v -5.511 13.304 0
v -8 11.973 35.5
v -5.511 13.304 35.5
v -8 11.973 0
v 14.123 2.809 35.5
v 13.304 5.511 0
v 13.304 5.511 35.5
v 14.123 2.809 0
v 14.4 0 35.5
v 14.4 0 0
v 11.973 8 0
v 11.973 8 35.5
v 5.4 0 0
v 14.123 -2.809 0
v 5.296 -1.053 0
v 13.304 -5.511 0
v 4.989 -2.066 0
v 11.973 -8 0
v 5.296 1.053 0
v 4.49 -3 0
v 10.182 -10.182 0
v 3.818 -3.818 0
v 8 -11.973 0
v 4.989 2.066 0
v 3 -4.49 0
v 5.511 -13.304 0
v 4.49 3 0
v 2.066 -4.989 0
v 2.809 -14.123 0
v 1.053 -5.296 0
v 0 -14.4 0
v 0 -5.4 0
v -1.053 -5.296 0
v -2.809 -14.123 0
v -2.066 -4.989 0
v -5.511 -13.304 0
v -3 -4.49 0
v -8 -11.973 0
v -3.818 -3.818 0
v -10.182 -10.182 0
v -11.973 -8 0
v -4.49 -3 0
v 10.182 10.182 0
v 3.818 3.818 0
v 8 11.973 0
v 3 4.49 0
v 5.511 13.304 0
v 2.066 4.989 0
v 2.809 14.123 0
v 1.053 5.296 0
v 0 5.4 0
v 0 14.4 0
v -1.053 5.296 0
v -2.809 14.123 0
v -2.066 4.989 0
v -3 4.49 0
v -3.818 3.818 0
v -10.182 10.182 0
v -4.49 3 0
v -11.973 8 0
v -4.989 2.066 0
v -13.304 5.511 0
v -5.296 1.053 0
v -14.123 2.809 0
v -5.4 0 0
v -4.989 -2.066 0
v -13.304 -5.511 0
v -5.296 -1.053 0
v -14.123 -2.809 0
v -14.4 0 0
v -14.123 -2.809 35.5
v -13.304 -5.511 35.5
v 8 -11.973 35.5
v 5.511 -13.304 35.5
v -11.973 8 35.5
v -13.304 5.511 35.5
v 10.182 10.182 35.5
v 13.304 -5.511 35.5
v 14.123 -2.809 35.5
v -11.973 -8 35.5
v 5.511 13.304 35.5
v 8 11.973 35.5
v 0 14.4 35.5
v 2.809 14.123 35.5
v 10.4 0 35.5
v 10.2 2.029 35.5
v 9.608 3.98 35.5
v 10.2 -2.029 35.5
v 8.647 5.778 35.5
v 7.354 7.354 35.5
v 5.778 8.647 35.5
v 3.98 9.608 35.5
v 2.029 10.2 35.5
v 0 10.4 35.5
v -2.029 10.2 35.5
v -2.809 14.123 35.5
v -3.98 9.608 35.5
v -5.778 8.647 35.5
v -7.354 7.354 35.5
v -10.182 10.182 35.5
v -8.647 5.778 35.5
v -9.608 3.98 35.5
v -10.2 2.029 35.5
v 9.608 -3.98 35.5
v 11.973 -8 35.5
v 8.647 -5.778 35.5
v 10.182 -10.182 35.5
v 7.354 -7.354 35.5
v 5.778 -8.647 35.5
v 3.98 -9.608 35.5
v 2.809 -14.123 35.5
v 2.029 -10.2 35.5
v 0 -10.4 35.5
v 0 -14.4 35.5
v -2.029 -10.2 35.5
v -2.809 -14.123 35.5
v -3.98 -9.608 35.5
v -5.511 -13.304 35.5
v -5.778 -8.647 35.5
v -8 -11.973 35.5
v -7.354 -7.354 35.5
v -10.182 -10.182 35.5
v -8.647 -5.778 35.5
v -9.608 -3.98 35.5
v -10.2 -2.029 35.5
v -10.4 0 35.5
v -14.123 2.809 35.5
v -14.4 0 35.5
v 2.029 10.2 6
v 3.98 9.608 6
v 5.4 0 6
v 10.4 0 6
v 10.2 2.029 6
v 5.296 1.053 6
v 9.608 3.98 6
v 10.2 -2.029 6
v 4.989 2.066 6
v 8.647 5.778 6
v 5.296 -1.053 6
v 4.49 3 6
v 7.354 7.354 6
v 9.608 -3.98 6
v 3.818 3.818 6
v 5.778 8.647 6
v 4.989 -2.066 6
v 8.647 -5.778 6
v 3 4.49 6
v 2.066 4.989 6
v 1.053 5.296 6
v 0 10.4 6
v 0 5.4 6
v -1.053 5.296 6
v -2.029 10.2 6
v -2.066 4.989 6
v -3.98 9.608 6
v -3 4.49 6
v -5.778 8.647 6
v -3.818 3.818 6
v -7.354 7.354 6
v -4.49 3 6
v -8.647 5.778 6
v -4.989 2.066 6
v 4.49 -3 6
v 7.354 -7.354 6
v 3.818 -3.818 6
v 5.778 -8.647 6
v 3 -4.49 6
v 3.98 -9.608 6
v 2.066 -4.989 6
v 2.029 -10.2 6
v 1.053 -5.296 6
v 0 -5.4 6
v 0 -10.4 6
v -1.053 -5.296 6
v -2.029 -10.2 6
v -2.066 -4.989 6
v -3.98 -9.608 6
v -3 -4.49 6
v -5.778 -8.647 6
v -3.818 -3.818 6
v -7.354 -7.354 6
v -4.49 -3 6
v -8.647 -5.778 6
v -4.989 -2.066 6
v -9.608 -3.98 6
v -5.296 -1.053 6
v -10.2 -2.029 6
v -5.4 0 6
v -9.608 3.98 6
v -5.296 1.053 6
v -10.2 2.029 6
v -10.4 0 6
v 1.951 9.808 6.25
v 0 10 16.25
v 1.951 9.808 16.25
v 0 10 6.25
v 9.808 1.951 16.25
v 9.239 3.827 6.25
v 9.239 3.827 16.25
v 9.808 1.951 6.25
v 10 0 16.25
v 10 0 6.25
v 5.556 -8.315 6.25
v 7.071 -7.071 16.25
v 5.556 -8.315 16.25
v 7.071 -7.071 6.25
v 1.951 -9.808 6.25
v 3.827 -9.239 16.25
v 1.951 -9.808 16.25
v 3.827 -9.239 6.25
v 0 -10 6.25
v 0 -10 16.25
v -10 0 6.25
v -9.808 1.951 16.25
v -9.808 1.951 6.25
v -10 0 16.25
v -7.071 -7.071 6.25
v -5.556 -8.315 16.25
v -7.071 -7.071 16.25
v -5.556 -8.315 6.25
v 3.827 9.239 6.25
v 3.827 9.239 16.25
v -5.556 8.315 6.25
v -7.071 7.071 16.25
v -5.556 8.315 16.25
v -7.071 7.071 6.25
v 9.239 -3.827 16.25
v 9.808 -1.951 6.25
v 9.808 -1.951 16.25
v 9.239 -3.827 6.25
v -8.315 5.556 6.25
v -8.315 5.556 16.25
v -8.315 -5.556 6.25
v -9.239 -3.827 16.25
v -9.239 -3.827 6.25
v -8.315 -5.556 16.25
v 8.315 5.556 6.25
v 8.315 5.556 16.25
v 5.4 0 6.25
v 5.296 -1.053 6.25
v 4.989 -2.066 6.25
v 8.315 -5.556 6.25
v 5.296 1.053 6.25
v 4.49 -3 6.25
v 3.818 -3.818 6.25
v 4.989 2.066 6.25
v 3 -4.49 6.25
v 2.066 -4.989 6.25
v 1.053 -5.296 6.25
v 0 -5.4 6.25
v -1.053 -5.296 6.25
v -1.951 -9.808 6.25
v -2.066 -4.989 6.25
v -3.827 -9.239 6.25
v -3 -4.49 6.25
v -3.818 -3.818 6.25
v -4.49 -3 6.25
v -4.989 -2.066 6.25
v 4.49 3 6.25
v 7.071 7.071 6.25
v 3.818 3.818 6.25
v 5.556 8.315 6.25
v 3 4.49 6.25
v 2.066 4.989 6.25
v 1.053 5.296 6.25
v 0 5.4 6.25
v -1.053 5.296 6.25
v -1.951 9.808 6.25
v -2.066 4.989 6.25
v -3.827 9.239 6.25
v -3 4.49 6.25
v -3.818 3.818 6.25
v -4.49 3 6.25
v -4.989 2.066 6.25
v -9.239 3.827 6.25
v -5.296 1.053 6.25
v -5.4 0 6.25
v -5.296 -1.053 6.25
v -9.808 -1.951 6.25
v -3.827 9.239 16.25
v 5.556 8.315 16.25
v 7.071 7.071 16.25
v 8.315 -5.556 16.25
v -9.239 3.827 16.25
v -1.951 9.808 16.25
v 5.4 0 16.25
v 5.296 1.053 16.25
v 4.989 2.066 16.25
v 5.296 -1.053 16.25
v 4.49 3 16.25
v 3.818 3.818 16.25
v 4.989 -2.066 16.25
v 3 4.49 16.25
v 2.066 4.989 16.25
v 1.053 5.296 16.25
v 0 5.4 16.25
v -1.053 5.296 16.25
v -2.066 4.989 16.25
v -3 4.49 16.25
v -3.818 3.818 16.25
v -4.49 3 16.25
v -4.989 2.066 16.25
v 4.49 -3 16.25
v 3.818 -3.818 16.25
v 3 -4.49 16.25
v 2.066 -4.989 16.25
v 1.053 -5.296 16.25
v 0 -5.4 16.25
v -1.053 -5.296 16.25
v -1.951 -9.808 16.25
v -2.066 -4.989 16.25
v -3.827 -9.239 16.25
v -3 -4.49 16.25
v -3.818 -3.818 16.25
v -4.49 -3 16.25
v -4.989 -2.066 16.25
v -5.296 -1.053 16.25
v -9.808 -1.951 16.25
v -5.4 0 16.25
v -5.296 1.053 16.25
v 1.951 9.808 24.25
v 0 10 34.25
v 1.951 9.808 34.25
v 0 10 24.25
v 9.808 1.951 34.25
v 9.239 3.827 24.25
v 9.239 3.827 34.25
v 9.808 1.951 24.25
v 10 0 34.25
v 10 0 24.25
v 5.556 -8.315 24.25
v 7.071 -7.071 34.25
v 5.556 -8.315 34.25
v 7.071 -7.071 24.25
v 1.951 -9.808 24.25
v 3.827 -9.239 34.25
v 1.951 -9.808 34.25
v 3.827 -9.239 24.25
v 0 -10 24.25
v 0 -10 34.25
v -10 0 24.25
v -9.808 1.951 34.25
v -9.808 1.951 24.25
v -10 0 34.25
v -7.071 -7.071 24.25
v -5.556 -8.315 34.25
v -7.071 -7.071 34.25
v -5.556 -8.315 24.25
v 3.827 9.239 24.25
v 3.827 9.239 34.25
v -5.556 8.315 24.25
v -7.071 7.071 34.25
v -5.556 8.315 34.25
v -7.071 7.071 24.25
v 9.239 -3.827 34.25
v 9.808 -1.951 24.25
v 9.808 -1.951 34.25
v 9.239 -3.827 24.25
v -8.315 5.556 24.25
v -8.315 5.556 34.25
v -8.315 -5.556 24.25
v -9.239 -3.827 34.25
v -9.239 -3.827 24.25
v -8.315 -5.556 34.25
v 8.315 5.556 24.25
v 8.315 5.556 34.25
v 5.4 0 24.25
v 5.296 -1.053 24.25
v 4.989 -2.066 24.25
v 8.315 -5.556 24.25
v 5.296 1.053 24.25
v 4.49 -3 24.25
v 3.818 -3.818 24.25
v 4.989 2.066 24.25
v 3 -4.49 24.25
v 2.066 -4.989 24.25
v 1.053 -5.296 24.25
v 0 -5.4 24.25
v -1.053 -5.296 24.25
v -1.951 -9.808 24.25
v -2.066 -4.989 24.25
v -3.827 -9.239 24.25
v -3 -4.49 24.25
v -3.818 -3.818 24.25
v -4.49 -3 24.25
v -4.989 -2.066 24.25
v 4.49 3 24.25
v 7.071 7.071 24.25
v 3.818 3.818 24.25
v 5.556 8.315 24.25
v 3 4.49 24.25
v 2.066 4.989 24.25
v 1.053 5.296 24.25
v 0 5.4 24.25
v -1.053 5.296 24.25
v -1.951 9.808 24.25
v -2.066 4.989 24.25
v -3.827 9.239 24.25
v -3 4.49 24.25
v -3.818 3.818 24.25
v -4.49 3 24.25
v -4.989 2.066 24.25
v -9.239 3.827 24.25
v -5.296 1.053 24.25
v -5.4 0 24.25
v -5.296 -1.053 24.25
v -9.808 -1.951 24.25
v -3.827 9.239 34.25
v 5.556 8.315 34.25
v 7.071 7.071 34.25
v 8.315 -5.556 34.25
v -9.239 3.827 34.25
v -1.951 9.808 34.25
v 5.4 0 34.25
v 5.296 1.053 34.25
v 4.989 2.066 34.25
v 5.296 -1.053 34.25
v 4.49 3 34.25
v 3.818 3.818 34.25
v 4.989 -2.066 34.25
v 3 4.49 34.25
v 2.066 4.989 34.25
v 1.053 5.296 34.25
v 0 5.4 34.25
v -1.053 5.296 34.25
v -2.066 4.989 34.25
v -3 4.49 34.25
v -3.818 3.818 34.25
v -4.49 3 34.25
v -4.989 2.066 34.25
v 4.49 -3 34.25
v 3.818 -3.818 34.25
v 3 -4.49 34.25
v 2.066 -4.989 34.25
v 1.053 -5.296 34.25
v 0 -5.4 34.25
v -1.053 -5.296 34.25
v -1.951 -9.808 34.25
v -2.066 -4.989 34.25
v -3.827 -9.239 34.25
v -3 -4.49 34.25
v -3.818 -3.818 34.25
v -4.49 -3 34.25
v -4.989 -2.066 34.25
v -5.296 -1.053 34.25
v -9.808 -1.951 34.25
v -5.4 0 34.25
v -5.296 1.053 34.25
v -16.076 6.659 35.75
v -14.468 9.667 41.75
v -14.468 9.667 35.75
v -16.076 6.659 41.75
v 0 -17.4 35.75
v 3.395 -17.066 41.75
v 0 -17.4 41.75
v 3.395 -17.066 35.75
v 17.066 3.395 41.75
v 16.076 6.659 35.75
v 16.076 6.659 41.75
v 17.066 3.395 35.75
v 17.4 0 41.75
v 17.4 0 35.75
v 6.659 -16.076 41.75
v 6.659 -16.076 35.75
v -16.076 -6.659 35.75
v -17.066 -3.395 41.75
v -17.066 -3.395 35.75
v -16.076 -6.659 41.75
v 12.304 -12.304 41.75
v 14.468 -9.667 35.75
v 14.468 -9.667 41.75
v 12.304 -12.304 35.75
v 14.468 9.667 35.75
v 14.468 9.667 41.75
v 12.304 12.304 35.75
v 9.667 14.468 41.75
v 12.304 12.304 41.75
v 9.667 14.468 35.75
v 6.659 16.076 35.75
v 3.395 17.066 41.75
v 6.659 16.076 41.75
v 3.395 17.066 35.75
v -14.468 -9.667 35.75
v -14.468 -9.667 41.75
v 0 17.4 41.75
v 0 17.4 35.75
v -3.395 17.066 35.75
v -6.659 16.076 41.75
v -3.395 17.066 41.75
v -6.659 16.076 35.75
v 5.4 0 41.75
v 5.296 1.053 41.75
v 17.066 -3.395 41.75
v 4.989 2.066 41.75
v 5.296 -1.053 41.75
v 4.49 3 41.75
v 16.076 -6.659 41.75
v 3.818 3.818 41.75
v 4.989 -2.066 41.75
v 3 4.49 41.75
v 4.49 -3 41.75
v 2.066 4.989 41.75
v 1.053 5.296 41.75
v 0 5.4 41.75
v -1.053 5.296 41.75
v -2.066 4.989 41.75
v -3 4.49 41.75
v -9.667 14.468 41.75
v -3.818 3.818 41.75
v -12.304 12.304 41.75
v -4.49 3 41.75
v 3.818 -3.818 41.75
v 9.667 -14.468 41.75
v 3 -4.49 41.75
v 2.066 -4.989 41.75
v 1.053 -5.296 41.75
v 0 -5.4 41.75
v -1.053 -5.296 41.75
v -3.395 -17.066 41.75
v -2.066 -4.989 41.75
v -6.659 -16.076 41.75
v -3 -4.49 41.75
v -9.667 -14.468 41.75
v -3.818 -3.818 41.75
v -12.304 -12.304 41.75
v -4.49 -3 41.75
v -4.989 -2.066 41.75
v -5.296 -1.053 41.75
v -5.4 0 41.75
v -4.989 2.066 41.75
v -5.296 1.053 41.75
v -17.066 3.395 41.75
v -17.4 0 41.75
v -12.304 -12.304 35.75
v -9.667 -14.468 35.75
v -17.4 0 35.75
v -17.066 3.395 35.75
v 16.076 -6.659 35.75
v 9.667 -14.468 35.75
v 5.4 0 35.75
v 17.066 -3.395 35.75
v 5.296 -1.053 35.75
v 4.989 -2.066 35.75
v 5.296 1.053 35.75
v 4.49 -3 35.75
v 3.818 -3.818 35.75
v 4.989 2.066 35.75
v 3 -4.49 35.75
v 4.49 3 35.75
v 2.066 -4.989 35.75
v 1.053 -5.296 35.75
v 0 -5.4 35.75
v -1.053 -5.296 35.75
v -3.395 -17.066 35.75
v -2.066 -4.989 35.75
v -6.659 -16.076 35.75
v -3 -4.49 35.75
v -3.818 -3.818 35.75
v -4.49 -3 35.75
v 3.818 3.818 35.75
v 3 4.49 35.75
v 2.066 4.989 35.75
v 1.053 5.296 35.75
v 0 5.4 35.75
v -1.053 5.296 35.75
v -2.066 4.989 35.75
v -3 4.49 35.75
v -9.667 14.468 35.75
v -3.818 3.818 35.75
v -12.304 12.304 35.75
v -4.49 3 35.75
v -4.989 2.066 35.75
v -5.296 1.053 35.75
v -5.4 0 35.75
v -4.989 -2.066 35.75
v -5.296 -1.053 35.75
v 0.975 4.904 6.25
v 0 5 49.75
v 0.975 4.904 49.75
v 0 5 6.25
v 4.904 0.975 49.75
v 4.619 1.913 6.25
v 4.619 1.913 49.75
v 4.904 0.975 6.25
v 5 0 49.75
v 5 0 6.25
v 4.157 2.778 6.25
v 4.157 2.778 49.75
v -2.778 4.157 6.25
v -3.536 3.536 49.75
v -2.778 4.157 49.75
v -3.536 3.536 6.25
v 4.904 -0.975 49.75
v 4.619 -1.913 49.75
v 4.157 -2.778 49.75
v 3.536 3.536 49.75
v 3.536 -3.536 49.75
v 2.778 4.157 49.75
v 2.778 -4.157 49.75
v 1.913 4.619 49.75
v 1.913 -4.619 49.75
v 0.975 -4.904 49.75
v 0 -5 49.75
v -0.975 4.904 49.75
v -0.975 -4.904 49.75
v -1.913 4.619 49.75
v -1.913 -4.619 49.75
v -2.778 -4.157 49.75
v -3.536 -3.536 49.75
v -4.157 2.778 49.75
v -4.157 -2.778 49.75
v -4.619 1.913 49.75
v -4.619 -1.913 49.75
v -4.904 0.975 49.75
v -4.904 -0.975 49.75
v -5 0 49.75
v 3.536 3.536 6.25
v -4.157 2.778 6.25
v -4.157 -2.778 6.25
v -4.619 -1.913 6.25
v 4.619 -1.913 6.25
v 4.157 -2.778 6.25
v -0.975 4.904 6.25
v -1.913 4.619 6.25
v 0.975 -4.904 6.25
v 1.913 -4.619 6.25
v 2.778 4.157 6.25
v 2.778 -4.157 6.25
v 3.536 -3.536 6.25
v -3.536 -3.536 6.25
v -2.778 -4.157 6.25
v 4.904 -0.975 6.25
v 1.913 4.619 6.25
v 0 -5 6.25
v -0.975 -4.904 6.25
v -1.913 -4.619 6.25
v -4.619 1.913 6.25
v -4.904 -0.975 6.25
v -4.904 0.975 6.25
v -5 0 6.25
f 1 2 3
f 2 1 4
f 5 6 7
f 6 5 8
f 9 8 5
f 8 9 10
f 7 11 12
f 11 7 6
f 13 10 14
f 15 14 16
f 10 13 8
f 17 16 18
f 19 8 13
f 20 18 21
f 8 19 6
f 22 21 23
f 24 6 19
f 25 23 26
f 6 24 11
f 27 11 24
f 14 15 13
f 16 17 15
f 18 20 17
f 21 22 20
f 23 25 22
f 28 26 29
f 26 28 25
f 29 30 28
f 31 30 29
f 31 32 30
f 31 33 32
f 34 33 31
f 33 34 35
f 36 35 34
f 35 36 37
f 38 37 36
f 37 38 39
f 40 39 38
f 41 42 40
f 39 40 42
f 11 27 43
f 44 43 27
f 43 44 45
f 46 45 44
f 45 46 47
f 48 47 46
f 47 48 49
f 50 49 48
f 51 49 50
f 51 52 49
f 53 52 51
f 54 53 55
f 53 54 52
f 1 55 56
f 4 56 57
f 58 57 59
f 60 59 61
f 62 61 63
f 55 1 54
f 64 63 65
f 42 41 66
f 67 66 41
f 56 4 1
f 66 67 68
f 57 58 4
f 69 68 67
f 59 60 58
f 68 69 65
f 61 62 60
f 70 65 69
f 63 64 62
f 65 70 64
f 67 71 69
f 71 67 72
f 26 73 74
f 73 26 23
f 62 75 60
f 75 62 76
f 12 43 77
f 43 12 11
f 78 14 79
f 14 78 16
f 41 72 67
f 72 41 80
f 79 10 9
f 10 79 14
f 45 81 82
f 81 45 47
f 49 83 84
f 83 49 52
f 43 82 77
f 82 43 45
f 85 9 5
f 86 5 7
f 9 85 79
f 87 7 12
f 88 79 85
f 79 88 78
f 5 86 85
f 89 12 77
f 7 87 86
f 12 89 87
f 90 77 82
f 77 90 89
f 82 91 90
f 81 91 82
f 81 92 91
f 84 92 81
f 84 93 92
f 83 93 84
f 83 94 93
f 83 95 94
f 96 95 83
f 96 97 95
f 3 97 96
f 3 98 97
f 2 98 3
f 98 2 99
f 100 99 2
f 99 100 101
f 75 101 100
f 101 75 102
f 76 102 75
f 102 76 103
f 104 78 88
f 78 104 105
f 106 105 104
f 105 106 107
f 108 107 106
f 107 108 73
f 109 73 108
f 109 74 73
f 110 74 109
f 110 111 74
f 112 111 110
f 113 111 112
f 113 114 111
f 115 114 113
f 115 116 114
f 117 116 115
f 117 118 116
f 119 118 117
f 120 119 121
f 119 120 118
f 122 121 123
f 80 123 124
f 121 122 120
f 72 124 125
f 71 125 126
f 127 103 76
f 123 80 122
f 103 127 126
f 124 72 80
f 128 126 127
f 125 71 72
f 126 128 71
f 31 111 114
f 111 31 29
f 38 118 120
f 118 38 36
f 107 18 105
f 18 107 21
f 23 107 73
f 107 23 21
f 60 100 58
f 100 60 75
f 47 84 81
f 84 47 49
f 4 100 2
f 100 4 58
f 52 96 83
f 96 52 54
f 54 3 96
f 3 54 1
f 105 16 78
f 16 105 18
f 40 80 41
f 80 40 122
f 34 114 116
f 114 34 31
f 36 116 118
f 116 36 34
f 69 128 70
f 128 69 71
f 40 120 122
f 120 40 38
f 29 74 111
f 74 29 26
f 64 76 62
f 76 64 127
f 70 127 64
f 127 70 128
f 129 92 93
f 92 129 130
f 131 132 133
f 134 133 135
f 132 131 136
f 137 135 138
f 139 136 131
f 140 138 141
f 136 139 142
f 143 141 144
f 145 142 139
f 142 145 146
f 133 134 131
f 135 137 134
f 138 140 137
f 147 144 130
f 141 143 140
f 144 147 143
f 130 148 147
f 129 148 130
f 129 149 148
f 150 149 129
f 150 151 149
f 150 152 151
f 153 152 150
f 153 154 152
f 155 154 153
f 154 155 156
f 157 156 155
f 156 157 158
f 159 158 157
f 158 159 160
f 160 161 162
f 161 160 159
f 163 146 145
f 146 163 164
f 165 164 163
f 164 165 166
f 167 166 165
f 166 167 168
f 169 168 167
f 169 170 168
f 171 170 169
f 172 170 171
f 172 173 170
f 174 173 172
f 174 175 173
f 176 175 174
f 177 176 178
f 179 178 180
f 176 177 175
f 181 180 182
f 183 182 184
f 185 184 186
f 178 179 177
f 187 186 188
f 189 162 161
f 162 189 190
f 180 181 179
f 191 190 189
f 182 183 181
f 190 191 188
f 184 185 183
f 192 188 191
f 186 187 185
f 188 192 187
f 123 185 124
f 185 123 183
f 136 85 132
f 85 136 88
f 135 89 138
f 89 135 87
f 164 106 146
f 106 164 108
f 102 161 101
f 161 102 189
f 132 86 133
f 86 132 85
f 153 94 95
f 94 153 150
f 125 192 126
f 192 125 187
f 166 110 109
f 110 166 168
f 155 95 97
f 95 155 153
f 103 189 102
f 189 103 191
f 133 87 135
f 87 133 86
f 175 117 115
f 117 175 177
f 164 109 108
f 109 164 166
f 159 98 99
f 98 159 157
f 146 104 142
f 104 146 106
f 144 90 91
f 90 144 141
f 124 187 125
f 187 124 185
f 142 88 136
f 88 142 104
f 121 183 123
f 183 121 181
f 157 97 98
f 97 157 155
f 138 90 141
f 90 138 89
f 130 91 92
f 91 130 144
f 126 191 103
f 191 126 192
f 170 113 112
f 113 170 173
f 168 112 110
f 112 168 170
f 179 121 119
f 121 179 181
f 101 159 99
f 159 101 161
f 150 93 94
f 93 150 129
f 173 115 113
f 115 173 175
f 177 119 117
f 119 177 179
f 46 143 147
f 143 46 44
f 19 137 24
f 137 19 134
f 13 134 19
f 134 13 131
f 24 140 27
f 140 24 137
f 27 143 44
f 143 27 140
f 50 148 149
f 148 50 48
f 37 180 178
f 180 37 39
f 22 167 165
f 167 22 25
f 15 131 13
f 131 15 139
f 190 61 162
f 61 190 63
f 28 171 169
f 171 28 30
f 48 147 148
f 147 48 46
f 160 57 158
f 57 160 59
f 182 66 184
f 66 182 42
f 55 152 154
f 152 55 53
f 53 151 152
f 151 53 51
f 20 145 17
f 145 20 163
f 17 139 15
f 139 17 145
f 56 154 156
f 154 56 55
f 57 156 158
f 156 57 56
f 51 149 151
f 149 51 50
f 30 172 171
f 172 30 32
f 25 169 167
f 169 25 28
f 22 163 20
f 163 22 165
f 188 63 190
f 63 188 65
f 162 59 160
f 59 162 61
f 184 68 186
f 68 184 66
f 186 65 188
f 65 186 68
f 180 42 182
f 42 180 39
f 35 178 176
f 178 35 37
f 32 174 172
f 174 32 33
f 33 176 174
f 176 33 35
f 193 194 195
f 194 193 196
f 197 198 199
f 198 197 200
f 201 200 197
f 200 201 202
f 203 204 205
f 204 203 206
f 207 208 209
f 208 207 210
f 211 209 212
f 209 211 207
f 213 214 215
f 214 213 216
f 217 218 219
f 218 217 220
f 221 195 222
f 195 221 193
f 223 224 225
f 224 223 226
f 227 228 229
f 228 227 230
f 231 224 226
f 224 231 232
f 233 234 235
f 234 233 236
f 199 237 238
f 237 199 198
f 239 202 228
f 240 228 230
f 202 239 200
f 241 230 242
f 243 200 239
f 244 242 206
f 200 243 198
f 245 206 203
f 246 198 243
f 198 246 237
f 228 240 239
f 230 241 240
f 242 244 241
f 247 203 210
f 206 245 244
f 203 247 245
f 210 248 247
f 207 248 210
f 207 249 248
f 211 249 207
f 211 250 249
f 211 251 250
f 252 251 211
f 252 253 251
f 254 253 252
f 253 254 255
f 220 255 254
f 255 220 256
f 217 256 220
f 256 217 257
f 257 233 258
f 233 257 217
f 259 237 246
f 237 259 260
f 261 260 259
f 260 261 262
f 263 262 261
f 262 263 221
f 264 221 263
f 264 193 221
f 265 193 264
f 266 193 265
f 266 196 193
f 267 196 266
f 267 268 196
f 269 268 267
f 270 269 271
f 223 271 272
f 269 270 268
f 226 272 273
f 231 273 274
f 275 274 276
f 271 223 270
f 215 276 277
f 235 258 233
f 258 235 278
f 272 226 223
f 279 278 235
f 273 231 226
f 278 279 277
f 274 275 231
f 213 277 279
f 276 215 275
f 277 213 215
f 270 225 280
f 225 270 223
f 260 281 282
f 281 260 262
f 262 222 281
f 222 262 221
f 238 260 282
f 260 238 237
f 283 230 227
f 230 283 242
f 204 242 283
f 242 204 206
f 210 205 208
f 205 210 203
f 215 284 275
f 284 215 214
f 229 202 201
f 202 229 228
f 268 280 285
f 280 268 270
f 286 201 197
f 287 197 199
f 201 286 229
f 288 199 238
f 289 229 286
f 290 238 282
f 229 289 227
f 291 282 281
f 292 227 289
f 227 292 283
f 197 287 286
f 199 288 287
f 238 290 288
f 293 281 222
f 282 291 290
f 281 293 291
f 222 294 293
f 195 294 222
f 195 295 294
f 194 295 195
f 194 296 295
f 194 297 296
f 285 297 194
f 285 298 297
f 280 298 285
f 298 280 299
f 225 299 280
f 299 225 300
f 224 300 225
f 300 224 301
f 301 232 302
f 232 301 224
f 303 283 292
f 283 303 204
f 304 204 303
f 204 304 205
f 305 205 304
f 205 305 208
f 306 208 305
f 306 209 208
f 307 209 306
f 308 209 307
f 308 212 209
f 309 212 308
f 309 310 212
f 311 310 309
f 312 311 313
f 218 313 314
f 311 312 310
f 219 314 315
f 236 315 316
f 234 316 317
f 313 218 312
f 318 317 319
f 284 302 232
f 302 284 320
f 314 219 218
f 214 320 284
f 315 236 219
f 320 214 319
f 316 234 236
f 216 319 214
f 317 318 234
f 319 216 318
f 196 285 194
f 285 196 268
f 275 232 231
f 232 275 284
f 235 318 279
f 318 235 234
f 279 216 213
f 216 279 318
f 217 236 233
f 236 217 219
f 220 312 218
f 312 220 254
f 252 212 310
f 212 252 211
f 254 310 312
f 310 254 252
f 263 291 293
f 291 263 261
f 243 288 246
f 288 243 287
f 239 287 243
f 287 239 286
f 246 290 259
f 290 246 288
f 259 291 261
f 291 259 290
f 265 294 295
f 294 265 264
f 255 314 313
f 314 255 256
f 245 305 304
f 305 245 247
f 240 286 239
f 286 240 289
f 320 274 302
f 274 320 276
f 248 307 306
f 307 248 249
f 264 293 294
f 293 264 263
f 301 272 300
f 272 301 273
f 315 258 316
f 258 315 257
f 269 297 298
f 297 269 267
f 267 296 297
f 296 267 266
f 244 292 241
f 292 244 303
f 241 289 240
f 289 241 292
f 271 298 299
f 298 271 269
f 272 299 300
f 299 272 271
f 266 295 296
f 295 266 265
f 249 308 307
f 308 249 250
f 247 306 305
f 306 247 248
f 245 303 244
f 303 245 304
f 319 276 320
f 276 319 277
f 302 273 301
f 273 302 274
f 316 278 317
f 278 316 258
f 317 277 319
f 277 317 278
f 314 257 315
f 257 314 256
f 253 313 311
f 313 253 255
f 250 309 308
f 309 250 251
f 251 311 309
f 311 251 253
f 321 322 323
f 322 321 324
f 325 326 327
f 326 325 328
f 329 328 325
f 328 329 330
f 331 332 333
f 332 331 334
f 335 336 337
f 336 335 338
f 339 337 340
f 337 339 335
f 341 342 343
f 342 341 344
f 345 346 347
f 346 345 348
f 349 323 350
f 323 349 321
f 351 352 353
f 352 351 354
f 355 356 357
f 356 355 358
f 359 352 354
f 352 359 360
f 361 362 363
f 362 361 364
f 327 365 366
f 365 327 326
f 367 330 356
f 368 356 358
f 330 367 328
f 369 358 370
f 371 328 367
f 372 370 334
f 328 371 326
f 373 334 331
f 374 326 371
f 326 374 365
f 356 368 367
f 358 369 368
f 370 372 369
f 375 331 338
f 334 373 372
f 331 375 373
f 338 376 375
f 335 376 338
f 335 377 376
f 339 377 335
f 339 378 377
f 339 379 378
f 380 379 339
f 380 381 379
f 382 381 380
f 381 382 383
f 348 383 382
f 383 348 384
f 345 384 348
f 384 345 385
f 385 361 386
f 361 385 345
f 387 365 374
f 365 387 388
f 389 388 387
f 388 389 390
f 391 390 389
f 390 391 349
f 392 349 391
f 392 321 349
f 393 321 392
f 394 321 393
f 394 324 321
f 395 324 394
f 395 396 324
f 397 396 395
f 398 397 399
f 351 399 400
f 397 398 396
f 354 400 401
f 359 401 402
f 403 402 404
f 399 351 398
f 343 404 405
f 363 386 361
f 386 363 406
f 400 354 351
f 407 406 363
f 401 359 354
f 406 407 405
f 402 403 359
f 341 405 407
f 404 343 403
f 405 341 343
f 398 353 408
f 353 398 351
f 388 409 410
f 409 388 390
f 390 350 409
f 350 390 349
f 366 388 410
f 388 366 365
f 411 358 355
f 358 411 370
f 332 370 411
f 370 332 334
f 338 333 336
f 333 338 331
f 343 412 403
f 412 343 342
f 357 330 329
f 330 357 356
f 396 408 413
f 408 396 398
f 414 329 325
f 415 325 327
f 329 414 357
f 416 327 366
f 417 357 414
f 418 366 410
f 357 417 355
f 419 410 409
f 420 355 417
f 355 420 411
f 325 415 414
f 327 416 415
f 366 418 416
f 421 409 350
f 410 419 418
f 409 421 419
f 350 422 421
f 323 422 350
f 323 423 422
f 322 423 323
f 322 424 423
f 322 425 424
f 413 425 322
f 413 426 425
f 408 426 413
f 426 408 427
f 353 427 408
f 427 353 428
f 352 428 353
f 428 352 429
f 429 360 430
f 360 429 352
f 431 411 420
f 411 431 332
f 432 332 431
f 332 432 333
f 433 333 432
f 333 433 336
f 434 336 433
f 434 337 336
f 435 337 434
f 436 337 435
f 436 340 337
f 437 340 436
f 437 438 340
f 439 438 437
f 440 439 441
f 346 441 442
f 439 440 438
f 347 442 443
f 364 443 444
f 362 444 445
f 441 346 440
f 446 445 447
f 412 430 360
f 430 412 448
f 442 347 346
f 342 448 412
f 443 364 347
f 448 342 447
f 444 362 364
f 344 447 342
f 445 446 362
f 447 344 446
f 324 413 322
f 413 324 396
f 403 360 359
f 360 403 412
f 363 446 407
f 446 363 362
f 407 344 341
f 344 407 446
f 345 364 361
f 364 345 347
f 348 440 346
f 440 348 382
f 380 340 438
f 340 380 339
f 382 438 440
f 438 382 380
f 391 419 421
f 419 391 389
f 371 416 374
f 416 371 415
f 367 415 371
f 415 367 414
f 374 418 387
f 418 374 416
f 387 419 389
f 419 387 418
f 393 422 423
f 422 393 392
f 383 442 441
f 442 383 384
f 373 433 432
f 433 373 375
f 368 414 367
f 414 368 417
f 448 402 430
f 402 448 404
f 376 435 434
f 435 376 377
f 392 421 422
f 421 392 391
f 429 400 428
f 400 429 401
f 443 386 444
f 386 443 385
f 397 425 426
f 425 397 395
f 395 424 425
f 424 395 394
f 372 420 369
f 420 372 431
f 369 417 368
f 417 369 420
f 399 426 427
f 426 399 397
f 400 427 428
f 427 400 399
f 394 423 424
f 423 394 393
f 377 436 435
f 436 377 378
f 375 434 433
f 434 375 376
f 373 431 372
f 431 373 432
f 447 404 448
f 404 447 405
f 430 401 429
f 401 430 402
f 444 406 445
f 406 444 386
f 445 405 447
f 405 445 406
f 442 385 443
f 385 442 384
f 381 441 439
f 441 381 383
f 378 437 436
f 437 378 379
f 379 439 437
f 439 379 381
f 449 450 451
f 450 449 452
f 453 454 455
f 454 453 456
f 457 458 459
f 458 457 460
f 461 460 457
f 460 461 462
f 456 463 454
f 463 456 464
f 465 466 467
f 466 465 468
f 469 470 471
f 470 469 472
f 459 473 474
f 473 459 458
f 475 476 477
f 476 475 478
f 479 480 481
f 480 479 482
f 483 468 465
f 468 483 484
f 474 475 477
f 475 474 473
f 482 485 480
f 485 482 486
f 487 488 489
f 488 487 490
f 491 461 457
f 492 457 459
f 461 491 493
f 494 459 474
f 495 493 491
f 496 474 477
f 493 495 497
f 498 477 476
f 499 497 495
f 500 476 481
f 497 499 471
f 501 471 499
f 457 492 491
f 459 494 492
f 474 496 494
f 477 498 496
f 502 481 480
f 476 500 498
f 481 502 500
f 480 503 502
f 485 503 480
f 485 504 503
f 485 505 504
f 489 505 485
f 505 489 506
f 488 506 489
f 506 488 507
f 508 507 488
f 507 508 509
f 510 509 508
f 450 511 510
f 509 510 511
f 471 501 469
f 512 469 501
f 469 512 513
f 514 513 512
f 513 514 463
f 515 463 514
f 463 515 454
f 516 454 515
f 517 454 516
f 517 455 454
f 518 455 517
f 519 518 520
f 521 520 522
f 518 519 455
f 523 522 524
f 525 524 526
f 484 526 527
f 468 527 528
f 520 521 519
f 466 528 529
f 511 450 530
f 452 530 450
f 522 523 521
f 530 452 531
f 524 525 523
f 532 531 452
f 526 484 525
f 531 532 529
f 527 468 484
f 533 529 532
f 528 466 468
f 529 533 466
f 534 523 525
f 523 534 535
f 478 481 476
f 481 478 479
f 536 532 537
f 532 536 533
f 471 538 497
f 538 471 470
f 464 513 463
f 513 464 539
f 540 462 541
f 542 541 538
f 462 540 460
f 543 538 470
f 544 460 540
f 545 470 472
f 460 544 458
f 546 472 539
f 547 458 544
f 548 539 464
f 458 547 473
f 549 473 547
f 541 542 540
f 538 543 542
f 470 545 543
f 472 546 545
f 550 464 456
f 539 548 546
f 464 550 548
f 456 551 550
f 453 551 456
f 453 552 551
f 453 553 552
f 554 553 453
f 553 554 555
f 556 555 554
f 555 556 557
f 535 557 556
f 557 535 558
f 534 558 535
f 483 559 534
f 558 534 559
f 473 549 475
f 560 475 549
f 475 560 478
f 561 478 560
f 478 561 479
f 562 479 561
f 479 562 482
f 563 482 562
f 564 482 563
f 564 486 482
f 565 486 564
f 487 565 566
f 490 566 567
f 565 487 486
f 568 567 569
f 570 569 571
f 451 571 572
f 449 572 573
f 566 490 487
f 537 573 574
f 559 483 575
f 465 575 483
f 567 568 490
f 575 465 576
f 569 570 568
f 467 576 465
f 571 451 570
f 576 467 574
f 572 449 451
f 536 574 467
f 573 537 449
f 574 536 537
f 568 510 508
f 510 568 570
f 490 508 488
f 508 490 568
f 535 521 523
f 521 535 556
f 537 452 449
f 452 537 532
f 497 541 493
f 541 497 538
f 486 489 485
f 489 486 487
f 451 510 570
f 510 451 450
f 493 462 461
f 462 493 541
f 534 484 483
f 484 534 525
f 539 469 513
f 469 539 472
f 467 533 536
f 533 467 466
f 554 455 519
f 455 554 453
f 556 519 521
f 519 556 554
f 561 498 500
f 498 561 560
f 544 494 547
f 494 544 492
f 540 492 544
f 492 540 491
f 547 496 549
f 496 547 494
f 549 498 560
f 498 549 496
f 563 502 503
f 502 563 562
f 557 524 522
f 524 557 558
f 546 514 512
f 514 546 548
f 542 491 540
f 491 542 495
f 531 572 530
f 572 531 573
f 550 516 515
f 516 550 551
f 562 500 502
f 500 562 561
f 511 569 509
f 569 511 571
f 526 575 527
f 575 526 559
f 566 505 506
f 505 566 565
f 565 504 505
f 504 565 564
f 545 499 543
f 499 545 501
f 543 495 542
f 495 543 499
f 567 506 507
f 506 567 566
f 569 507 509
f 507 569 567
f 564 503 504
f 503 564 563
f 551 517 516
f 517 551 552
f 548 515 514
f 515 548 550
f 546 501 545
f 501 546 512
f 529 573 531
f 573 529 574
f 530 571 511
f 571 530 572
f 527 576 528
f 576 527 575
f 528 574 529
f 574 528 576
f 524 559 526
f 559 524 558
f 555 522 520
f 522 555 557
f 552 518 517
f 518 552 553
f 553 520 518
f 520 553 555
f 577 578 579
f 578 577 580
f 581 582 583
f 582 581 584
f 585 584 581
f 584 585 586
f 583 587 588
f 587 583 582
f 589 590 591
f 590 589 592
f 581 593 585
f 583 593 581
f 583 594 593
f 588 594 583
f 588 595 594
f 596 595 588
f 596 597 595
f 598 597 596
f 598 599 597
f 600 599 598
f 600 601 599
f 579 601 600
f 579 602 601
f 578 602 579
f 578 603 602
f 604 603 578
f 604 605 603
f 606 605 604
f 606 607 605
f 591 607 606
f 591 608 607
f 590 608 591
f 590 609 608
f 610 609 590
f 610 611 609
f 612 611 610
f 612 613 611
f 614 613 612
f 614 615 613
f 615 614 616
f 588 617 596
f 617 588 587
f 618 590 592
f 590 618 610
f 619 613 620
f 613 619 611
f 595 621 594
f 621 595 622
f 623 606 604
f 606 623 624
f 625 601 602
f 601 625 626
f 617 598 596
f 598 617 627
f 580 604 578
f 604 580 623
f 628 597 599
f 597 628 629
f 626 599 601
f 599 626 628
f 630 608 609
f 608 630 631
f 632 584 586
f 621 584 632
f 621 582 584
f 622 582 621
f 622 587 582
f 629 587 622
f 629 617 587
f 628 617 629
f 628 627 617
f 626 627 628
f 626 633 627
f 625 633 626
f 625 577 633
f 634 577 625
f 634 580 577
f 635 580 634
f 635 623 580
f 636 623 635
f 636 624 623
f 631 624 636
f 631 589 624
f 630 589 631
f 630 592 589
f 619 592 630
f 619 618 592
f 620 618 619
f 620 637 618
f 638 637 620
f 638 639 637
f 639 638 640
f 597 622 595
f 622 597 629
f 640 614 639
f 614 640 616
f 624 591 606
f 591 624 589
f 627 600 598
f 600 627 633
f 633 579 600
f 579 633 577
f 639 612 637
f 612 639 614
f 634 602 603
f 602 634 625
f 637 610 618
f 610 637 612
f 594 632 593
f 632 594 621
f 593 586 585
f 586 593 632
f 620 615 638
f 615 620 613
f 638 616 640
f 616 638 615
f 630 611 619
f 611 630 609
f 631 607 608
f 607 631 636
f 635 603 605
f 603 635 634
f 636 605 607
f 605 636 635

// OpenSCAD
$fn = 32;

// ------------------------------------------------------------------------
// Shaft station: cup d28.8 x 35.5 mm, shaft d10
// Every part is its own module, assembly() places every instance.
// ------------------------------------------------------------------------

// --- part 1 ---
module housing_cup() {
  difference() {
    cylinder(h = 35.5, d = 28.8);
    translate([0, 0, 6]) cylinder(h = 30.5, d = 20.8);
    translate([0, 0, -1]) cylinder(h = 8, d = 10.8);
  }
}

// --- part 2 ---
module bearing_lower() {
  difference() {
      translate([0, 0, 0]) cylinder(h = 10, d = 20);
      translate([0, 0, -1]) cylinder(h = 12, d = 10.8);
    }
}

// --- part 3 ---
module bearing_upper() {
  difference() {
      translate([0, 0, 0]) cylinder(h = 10, d = 20);
      translate([0, 0, -1]) cylinder(h = 12, d = 10.8);
    }
}

// --- part 4 ---
module station_shaft() {
  translate([0, 0, -21.75]) cylinder(h = 43.5, d = 10);
}

// --- part 5 ---
module station_cover() {
  difference() {
    cylinder(h = 6, d = 34.8);
    translate([0, 0, -1]) cylinder(h = 8, d = 10.8);
  }
}

// --- assembly ---
module assembly() {
  color([0.80, 0.24, 0.20]) translate([0, 0, 0]) rotate([0, 0, 0]) housing_cup();
  color([0.20, 0.45, 0.75]) translate([0, 0, 6.25]) rotate([0, 0, 0]) bearing_lower();
  color([0.25, 0.62, 0.32]) translate([0, 0, 24.25]) rotate([0, 0, 0]) bearing_upper();
  color([0.92, 0.70, 0.18]) translate([0, 0, 28]) rotate([0, 0, 0]) station_shaft();
  color([0.58, 0.35, 0.70]) translate([0, 0, 35.75]) rotate([0, 0, 0]) station_cover();
}

assembly();
